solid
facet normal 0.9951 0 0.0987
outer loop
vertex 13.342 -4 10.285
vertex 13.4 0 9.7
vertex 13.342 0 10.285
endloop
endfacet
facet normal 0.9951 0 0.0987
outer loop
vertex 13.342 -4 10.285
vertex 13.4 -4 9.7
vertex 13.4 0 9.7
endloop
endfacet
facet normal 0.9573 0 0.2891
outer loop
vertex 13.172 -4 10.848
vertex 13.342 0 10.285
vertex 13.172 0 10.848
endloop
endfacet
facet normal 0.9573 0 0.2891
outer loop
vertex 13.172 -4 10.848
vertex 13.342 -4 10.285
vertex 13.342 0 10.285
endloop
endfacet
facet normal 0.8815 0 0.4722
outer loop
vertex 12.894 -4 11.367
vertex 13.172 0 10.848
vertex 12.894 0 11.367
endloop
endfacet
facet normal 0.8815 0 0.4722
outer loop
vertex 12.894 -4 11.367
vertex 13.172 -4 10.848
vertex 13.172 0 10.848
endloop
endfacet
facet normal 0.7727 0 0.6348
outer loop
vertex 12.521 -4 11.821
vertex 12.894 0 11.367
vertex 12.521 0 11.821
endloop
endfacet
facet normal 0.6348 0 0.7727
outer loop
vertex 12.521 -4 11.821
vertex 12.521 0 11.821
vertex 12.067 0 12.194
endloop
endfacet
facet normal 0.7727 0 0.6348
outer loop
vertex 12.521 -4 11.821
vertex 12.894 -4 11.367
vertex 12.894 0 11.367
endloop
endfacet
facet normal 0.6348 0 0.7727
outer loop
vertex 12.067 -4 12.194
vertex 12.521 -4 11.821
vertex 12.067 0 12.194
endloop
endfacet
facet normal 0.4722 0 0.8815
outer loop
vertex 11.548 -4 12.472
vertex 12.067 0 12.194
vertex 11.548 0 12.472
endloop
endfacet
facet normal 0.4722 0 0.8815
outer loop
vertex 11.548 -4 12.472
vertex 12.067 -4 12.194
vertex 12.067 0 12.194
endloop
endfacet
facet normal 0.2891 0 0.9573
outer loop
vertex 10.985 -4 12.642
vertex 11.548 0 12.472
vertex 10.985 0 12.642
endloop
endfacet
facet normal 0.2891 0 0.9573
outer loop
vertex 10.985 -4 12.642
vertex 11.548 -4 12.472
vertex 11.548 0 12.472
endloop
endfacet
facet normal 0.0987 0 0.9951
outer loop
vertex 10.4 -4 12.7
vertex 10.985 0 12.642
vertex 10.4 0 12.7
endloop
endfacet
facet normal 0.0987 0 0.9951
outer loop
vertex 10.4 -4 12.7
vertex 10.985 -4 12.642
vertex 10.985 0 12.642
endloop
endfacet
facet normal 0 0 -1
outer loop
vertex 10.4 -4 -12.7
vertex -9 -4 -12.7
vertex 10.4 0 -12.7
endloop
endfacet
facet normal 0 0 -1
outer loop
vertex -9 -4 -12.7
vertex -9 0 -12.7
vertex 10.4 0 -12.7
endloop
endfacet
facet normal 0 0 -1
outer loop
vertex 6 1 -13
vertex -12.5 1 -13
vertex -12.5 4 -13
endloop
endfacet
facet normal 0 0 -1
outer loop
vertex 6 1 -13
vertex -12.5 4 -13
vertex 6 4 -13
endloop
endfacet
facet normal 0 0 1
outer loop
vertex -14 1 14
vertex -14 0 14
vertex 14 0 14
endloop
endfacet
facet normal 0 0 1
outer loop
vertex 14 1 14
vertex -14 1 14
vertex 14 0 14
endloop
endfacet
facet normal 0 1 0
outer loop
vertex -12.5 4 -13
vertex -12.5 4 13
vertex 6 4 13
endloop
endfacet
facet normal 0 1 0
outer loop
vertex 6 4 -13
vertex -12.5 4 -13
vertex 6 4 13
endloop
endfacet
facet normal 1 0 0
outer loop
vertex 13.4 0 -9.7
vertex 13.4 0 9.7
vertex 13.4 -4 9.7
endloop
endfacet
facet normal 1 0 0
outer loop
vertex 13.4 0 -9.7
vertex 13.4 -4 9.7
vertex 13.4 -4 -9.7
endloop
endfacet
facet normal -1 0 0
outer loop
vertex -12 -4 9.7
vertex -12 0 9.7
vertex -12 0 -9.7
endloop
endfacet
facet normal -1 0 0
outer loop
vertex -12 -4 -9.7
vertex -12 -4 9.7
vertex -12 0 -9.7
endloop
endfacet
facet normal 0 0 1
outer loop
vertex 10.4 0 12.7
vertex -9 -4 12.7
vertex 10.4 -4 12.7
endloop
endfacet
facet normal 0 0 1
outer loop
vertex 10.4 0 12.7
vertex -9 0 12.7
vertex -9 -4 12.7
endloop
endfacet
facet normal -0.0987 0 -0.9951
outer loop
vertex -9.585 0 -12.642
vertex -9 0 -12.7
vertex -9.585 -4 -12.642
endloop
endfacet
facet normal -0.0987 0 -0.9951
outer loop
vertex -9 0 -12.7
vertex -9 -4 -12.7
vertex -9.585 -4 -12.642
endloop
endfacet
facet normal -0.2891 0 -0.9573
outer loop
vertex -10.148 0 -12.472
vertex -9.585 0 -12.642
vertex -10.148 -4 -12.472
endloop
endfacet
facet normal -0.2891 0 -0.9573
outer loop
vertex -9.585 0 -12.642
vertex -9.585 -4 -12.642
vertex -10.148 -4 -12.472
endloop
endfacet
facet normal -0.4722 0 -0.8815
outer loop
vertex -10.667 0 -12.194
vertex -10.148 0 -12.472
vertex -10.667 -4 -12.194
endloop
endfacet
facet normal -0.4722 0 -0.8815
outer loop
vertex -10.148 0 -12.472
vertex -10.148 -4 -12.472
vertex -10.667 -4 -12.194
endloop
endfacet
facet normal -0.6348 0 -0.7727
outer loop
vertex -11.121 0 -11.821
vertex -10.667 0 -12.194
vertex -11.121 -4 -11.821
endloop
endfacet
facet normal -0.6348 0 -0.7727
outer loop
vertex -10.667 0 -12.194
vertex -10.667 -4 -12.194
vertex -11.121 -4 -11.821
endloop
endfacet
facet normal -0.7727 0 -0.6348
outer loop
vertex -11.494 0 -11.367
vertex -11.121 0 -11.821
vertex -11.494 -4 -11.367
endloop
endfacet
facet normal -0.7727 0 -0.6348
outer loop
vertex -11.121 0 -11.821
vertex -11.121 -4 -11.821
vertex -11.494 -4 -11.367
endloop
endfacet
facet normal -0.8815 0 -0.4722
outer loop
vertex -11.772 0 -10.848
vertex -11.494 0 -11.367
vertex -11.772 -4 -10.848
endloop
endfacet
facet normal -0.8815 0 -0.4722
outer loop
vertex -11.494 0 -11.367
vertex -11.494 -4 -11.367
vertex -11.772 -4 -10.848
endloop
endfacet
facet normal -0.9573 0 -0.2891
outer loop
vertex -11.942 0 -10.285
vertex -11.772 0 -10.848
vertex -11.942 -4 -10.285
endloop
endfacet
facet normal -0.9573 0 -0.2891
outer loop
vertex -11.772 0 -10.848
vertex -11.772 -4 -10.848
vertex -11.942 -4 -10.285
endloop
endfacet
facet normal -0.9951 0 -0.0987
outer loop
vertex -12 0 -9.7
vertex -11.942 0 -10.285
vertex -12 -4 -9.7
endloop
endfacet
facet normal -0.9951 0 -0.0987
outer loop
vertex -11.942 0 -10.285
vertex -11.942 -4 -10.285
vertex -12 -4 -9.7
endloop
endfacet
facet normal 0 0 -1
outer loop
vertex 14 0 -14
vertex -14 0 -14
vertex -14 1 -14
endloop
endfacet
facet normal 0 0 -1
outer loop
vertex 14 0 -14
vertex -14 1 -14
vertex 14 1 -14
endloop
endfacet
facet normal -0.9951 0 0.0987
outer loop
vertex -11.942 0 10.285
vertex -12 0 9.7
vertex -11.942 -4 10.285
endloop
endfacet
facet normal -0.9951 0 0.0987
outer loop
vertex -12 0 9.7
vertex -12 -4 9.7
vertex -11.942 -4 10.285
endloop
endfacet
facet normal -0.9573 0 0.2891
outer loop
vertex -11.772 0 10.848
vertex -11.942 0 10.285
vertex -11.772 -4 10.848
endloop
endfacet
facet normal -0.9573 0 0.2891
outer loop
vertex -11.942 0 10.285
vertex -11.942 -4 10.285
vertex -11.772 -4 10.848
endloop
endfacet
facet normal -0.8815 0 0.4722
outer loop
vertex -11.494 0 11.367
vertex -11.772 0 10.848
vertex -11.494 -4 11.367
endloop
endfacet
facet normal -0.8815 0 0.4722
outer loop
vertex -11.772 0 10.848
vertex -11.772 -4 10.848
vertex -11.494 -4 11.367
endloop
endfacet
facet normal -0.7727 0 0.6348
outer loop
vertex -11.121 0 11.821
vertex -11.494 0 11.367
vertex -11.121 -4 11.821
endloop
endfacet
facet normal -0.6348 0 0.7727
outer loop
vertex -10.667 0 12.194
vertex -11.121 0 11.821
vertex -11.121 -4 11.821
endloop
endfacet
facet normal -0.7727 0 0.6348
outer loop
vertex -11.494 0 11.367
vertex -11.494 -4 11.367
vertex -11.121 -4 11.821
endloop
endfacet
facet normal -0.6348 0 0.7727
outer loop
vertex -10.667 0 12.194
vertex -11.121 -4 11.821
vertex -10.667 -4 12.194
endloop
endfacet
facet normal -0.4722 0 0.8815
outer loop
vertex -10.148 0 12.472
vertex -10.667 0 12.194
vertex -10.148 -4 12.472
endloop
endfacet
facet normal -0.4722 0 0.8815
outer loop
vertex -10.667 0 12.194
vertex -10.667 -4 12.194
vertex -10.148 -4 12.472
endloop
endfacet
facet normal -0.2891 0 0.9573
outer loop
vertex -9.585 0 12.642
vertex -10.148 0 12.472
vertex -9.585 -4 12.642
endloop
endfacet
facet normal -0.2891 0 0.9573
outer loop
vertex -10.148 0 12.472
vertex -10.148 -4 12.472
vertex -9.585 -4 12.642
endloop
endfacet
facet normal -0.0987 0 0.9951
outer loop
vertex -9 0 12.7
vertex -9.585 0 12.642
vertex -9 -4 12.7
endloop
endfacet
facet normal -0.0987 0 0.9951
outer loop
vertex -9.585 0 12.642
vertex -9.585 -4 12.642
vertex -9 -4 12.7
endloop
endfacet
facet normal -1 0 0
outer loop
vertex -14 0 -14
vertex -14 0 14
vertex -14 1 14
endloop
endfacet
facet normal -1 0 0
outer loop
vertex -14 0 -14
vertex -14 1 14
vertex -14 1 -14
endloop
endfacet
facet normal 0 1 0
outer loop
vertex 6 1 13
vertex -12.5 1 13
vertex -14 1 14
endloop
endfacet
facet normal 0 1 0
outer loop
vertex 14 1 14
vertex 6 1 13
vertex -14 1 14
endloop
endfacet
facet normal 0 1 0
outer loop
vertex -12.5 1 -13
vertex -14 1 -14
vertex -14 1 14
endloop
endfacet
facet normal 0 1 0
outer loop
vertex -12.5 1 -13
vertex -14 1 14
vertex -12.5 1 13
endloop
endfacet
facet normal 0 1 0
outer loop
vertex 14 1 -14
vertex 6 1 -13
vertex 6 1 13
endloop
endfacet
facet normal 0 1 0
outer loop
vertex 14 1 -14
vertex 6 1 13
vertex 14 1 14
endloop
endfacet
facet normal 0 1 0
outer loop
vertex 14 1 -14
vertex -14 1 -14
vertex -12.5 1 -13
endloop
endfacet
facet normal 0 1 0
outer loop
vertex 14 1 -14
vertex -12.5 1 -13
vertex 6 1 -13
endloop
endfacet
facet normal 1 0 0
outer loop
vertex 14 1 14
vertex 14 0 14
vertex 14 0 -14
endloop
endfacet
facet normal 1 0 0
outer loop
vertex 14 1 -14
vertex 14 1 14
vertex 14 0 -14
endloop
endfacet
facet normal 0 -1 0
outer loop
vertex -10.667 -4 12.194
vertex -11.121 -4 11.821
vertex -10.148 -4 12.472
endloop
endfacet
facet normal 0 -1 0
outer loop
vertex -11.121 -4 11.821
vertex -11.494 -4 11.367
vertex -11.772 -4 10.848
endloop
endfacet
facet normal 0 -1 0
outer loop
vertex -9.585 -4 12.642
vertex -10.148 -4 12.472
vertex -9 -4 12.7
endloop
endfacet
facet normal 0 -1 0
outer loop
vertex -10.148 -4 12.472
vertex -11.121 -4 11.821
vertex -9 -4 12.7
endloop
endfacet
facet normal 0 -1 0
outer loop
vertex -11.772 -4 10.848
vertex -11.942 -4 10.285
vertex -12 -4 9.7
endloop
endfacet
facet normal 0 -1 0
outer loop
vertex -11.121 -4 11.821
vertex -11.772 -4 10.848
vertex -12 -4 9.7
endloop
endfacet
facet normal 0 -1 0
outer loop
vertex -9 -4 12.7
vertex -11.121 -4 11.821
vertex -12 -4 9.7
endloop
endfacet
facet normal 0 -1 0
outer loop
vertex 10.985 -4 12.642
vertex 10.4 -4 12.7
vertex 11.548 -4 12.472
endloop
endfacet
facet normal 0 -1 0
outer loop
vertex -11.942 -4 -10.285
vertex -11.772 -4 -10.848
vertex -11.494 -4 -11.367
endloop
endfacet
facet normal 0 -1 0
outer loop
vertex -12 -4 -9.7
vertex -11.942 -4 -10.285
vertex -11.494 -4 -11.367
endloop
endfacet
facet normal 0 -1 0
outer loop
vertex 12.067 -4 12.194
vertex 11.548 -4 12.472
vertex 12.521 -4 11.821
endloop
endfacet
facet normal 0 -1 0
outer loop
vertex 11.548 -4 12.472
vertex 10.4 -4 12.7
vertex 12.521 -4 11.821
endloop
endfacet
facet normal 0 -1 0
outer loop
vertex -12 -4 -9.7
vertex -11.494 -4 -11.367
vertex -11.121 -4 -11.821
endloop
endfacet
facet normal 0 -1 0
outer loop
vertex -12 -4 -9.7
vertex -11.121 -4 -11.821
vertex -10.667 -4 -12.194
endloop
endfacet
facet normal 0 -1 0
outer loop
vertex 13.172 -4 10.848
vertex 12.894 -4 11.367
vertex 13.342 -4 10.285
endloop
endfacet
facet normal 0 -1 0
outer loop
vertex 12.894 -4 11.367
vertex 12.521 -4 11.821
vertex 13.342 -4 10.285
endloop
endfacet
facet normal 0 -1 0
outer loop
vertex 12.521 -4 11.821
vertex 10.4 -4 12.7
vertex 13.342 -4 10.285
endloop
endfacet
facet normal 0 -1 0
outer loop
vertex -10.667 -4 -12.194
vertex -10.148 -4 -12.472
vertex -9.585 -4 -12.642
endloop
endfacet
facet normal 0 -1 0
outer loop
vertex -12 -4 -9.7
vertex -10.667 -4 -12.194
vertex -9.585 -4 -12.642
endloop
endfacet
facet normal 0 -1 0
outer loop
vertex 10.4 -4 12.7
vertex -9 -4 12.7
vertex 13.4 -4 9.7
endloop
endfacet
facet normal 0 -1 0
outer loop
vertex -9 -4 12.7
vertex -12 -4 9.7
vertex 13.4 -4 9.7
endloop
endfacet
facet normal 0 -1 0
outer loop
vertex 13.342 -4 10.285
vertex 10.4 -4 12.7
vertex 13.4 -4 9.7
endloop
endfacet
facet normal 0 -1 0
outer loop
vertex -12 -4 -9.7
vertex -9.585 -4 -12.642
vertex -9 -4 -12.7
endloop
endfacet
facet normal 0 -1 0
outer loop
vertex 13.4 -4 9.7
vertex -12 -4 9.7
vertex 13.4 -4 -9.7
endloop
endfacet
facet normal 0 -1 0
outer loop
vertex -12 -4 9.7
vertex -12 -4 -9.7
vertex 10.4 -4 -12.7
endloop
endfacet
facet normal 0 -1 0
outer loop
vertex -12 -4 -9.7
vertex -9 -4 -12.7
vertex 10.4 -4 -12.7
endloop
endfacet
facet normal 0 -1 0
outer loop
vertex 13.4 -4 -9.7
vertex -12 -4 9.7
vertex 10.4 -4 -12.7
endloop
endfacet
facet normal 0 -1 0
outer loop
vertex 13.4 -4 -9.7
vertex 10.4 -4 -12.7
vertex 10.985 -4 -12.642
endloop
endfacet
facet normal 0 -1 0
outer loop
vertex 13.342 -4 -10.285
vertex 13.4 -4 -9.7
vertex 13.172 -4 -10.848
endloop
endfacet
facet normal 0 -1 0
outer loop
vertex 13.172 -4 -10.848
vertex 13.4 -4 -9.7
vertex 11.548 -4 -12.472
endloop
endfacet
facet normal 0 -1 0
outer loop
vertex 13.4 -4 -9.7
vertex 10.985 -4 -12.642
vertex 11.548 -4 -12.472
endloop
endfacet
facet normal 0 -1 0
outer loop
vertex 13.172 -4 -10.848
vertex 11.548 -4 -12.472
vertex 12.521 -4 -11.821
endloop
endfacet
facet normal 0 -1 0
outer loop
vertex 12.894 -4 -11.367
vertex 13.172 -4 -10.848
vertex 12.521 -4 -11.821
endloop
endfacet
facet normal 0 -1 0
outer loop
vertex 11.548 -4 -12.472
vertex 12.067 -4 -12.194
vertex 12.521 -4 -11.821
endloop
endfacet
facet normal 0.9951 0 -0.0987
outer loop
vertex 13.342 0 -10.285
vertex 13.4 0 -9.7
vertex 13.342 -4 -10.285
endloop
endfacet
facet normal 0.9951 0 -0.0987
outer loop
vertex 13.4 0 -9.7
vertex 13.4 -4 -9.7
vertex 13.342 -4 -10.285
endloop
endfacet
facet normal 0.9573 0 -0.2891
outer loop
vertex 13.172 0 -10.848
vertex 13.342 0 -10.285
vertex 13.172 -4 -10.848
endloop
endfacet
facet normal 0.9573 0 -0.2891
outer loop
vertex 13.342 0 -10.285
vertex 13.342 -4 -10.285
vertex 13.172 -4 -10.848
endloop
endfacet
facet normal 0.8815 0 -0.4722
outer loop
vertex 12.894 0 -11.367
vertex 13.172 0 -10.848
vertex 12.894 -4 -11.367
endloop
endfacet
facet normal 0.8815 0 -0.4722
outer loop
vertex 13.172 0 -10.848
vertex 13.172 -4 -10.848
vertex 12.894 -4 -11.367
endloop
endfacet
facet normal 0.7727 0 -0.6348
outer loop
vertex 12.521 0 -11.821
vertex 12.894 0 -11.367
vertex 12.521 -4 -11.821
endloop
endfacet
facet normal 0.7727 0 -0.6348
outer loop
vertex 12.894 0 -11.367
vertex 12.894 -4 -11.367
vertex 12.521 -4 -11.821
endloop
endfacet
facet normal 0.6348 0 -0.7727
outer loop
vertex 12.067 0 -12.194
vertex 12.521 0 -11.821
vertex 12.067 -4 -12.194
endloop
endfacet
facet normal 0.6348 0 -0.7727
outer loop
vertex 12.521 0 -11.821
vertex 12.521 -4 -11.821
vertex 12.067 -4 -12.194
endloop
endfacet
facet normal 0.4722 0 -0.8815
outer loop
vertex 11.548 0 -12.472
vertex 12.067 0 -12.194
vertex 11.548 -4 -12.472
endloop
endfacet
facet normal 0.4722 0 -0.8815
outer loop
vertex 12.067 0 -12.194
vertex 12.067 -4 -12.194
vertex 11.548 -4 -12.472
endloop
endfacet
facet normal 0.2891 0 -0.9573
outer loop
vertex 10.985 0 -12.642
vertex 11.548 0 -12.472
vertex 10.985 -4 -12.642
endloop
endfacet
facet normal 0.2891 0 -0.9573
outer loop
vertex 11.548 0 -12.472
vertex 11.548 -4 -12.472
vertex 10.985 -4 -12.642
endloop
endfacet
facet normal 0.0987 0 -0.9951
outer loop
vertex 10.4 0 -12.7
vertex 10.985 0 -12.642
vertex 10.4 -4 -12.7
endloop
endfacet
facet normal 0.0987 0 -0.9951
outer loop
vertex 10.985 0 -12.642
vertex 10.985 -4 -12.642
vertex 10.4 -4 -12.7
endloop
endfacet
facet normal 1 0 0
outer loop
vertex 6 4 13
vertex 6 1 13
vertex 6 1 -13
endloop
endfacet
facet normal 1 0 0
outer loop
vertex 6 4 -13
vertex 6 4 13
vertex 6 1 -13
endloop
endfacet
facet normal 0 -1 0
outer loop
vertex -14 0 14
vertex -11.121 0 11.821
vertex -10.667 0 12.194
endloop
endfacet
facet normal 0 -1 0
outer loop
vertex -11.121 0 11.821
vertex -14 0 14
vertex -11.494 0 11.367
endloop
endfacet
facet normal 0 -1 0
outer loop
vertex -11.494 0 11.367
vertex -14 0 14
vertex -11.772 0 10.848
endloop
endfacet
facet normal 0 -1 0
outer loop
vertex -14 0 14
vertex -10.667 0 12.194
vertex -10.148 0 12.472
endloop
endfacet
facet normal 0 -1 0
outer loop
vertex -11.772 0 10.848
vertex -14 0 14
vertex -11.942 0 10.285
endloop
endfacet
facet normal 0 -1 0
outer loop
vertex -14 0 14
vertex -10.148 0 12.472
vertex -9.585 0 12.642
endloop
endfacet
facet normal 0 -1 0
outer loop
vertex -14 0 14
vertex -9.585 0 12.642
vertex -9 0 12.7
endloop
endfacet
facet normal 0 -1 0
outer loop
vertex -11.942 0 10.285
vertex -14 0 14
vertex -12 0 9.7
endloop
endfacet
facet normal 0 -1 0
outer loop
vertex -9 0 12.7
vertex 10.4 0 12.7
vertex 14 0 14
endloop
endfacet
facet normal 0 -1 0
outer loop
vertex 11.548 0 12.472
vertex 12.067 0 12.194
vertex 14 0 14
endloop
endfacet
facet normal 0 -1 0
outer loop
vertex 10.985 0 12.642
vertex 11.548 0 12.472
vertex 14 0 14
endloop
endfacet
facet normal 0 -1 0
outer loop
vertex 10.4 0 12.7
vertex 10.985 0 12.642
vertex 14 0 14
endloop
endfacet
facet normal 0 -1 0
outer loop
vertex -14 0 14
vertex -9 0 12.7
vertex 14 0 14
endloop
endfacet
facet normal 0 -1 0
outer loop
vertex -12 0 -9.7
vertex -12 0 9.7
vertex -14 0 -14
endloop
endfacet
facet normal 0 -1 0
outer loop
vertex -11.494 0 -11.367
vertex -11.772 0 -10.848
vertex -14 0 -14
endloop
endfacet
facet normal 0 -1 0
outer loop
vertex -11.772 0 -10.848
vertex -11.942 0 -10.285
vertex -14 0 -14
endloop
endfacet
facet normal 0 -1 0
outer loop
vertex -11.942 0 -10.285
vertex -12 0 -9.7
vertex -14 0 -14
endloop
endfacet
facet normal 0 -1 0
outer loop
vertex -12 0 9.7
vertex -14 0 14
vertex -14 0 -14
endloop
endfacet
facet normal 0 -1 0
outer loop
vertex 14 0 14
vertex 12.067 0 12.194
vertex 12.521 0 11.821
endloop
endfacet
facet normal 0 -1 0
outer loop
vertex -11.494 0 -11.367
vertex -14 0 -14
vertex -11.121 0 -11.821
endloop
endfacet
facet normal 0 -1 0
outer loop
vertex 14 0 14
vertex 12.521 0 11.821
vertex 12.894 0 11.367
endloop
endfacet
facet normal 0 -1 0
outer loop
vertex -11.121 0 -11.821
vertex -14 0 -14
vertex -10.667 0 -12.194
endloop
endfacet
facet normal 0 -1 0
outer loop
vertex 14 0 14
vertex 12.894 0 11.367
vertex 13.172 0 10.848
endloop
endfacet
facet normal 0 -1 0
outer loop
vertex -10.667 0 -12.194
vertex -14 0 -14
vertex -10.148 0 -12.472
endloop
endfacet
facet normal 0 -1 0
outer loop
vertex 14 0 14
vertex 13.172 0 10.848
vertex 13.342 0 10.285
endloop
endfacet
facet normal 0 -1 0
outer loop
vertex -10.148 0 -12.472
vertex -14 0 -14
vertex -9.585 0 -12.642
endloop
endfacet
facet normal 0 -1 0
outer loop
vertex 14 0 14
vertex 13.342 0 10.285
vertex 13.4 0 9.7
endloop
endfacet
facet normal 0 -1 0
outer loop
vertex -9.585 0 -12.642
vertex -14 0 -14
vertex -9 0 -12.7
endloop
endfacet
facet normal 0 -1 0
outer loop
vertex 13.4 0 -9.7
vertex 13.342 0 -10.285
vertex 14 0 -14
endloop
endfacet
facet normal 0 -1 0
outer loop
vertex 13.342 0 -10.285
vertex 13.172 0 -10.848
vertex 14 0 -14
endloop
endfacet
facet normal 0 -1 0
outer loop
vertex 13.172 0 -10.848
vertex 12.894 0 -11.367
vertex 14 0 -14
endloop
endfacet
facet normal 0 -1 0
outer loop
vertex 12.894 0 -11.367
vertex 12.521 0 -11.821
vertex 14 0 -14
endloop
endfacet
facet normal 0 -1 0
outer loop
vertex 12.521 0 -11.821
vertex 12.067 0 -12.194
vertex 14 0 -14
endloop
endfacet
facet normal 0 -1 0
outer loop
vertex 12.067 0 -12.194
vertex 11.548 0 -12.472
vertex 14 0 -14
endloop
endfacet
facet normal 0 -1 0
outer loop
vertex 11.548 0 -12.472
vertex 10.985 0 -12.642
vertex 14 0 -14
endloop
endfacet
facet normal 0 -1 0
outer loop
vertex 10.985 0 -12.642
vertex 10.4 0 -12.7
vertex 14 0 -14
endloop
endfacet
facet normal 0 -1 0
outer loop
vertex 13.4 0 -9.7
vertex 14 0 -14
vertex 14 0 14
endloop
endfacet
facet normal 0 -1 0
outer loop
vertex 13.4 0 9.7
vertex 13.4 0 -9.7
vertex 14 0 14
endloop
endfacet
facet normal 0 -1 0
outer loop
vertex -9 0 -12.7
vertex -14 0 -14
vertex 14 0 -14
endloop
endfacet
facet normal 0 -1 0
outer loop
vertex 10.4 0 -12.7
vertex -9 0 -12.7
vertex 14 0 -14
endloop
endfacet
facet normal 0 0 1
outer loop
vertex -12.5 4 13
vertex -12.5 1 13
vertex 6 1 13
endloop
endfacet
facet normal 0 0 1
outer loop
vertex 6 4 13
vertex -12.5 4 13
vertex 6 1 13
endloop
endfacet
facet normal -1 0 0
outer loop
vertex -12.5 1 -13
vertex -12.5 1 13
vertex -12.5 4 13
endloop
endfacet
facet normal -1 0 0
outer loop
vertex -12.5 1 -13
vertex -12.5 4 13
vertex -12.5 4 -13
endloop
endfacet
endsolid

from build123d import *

# Parameters (mm, degrees)
SKETCH_1_W      = 28
SKETCH_1_H      = 28
EXTRUDE_1_DEPTH = 1
SKETCH_1_3_W    = 25.4
SKETCH_1_3_H    = 25.4
EXTRUDE_2_DEPTH = 4
SKETCH_1_4_W    = 18.5
SKETCH_1_4_H    = 26
EXTRUDE_3_DEPTH = 4
FILLET_1_R      = 3


with BuildPart() as part:
    # Эскиз1 → Бобышка-Вытянуть1 (new body)
    with BuildSketch(Plane(origin=(0, 0, 0), x_dir=(1, 0, 0), z_dir=(0, 1, 0))):
        Rectangle(SKETCH_1_W, SKETCH_1_H)
    extrude(amount=EXTRUDE_1_DEPTH)

    # Эскиз1<3> → Бобышка-Вытянуть2 (add)
    with BuildSketch(Plane(origin=(0, 0, 0), x_dir=(1, 0, 0), z_dir=(0, 1, 0))):
        with Locations((0.7, 0)):
            Rectangle(SKETCH_1_3_W, SKETCH_1_3_H)
    extrude(amount=-EXTRUDE_2_DEPTH)

    # Эскиз1<4> → Бобышка-Вытянуть3 (add)
    with BuildSketch(Plane(origin=(0, 0, 0), x_dir=(1, 0, 0), z_dir=(0, 1, 0))):
        with Locations((-3.25, 0)):
            Rectangle(SKETCH_1_4_W, SKETCH_1_4_H)
    extrude(amount=EXTRUDE_3_DEPTH)

    # Скругление1
    fillet_1_edges = [part.edges().sort_by_distance(p)[0] for p in [
        (-12, -2, 12.7),
        (13.4, -2, 12.7),
        (13.4, -2, -12.7),
        (-12, -2, -12.7),
    ]]
    fillet(fillet_1_edges, radius=FILLET_1_R)


solid = part.part
